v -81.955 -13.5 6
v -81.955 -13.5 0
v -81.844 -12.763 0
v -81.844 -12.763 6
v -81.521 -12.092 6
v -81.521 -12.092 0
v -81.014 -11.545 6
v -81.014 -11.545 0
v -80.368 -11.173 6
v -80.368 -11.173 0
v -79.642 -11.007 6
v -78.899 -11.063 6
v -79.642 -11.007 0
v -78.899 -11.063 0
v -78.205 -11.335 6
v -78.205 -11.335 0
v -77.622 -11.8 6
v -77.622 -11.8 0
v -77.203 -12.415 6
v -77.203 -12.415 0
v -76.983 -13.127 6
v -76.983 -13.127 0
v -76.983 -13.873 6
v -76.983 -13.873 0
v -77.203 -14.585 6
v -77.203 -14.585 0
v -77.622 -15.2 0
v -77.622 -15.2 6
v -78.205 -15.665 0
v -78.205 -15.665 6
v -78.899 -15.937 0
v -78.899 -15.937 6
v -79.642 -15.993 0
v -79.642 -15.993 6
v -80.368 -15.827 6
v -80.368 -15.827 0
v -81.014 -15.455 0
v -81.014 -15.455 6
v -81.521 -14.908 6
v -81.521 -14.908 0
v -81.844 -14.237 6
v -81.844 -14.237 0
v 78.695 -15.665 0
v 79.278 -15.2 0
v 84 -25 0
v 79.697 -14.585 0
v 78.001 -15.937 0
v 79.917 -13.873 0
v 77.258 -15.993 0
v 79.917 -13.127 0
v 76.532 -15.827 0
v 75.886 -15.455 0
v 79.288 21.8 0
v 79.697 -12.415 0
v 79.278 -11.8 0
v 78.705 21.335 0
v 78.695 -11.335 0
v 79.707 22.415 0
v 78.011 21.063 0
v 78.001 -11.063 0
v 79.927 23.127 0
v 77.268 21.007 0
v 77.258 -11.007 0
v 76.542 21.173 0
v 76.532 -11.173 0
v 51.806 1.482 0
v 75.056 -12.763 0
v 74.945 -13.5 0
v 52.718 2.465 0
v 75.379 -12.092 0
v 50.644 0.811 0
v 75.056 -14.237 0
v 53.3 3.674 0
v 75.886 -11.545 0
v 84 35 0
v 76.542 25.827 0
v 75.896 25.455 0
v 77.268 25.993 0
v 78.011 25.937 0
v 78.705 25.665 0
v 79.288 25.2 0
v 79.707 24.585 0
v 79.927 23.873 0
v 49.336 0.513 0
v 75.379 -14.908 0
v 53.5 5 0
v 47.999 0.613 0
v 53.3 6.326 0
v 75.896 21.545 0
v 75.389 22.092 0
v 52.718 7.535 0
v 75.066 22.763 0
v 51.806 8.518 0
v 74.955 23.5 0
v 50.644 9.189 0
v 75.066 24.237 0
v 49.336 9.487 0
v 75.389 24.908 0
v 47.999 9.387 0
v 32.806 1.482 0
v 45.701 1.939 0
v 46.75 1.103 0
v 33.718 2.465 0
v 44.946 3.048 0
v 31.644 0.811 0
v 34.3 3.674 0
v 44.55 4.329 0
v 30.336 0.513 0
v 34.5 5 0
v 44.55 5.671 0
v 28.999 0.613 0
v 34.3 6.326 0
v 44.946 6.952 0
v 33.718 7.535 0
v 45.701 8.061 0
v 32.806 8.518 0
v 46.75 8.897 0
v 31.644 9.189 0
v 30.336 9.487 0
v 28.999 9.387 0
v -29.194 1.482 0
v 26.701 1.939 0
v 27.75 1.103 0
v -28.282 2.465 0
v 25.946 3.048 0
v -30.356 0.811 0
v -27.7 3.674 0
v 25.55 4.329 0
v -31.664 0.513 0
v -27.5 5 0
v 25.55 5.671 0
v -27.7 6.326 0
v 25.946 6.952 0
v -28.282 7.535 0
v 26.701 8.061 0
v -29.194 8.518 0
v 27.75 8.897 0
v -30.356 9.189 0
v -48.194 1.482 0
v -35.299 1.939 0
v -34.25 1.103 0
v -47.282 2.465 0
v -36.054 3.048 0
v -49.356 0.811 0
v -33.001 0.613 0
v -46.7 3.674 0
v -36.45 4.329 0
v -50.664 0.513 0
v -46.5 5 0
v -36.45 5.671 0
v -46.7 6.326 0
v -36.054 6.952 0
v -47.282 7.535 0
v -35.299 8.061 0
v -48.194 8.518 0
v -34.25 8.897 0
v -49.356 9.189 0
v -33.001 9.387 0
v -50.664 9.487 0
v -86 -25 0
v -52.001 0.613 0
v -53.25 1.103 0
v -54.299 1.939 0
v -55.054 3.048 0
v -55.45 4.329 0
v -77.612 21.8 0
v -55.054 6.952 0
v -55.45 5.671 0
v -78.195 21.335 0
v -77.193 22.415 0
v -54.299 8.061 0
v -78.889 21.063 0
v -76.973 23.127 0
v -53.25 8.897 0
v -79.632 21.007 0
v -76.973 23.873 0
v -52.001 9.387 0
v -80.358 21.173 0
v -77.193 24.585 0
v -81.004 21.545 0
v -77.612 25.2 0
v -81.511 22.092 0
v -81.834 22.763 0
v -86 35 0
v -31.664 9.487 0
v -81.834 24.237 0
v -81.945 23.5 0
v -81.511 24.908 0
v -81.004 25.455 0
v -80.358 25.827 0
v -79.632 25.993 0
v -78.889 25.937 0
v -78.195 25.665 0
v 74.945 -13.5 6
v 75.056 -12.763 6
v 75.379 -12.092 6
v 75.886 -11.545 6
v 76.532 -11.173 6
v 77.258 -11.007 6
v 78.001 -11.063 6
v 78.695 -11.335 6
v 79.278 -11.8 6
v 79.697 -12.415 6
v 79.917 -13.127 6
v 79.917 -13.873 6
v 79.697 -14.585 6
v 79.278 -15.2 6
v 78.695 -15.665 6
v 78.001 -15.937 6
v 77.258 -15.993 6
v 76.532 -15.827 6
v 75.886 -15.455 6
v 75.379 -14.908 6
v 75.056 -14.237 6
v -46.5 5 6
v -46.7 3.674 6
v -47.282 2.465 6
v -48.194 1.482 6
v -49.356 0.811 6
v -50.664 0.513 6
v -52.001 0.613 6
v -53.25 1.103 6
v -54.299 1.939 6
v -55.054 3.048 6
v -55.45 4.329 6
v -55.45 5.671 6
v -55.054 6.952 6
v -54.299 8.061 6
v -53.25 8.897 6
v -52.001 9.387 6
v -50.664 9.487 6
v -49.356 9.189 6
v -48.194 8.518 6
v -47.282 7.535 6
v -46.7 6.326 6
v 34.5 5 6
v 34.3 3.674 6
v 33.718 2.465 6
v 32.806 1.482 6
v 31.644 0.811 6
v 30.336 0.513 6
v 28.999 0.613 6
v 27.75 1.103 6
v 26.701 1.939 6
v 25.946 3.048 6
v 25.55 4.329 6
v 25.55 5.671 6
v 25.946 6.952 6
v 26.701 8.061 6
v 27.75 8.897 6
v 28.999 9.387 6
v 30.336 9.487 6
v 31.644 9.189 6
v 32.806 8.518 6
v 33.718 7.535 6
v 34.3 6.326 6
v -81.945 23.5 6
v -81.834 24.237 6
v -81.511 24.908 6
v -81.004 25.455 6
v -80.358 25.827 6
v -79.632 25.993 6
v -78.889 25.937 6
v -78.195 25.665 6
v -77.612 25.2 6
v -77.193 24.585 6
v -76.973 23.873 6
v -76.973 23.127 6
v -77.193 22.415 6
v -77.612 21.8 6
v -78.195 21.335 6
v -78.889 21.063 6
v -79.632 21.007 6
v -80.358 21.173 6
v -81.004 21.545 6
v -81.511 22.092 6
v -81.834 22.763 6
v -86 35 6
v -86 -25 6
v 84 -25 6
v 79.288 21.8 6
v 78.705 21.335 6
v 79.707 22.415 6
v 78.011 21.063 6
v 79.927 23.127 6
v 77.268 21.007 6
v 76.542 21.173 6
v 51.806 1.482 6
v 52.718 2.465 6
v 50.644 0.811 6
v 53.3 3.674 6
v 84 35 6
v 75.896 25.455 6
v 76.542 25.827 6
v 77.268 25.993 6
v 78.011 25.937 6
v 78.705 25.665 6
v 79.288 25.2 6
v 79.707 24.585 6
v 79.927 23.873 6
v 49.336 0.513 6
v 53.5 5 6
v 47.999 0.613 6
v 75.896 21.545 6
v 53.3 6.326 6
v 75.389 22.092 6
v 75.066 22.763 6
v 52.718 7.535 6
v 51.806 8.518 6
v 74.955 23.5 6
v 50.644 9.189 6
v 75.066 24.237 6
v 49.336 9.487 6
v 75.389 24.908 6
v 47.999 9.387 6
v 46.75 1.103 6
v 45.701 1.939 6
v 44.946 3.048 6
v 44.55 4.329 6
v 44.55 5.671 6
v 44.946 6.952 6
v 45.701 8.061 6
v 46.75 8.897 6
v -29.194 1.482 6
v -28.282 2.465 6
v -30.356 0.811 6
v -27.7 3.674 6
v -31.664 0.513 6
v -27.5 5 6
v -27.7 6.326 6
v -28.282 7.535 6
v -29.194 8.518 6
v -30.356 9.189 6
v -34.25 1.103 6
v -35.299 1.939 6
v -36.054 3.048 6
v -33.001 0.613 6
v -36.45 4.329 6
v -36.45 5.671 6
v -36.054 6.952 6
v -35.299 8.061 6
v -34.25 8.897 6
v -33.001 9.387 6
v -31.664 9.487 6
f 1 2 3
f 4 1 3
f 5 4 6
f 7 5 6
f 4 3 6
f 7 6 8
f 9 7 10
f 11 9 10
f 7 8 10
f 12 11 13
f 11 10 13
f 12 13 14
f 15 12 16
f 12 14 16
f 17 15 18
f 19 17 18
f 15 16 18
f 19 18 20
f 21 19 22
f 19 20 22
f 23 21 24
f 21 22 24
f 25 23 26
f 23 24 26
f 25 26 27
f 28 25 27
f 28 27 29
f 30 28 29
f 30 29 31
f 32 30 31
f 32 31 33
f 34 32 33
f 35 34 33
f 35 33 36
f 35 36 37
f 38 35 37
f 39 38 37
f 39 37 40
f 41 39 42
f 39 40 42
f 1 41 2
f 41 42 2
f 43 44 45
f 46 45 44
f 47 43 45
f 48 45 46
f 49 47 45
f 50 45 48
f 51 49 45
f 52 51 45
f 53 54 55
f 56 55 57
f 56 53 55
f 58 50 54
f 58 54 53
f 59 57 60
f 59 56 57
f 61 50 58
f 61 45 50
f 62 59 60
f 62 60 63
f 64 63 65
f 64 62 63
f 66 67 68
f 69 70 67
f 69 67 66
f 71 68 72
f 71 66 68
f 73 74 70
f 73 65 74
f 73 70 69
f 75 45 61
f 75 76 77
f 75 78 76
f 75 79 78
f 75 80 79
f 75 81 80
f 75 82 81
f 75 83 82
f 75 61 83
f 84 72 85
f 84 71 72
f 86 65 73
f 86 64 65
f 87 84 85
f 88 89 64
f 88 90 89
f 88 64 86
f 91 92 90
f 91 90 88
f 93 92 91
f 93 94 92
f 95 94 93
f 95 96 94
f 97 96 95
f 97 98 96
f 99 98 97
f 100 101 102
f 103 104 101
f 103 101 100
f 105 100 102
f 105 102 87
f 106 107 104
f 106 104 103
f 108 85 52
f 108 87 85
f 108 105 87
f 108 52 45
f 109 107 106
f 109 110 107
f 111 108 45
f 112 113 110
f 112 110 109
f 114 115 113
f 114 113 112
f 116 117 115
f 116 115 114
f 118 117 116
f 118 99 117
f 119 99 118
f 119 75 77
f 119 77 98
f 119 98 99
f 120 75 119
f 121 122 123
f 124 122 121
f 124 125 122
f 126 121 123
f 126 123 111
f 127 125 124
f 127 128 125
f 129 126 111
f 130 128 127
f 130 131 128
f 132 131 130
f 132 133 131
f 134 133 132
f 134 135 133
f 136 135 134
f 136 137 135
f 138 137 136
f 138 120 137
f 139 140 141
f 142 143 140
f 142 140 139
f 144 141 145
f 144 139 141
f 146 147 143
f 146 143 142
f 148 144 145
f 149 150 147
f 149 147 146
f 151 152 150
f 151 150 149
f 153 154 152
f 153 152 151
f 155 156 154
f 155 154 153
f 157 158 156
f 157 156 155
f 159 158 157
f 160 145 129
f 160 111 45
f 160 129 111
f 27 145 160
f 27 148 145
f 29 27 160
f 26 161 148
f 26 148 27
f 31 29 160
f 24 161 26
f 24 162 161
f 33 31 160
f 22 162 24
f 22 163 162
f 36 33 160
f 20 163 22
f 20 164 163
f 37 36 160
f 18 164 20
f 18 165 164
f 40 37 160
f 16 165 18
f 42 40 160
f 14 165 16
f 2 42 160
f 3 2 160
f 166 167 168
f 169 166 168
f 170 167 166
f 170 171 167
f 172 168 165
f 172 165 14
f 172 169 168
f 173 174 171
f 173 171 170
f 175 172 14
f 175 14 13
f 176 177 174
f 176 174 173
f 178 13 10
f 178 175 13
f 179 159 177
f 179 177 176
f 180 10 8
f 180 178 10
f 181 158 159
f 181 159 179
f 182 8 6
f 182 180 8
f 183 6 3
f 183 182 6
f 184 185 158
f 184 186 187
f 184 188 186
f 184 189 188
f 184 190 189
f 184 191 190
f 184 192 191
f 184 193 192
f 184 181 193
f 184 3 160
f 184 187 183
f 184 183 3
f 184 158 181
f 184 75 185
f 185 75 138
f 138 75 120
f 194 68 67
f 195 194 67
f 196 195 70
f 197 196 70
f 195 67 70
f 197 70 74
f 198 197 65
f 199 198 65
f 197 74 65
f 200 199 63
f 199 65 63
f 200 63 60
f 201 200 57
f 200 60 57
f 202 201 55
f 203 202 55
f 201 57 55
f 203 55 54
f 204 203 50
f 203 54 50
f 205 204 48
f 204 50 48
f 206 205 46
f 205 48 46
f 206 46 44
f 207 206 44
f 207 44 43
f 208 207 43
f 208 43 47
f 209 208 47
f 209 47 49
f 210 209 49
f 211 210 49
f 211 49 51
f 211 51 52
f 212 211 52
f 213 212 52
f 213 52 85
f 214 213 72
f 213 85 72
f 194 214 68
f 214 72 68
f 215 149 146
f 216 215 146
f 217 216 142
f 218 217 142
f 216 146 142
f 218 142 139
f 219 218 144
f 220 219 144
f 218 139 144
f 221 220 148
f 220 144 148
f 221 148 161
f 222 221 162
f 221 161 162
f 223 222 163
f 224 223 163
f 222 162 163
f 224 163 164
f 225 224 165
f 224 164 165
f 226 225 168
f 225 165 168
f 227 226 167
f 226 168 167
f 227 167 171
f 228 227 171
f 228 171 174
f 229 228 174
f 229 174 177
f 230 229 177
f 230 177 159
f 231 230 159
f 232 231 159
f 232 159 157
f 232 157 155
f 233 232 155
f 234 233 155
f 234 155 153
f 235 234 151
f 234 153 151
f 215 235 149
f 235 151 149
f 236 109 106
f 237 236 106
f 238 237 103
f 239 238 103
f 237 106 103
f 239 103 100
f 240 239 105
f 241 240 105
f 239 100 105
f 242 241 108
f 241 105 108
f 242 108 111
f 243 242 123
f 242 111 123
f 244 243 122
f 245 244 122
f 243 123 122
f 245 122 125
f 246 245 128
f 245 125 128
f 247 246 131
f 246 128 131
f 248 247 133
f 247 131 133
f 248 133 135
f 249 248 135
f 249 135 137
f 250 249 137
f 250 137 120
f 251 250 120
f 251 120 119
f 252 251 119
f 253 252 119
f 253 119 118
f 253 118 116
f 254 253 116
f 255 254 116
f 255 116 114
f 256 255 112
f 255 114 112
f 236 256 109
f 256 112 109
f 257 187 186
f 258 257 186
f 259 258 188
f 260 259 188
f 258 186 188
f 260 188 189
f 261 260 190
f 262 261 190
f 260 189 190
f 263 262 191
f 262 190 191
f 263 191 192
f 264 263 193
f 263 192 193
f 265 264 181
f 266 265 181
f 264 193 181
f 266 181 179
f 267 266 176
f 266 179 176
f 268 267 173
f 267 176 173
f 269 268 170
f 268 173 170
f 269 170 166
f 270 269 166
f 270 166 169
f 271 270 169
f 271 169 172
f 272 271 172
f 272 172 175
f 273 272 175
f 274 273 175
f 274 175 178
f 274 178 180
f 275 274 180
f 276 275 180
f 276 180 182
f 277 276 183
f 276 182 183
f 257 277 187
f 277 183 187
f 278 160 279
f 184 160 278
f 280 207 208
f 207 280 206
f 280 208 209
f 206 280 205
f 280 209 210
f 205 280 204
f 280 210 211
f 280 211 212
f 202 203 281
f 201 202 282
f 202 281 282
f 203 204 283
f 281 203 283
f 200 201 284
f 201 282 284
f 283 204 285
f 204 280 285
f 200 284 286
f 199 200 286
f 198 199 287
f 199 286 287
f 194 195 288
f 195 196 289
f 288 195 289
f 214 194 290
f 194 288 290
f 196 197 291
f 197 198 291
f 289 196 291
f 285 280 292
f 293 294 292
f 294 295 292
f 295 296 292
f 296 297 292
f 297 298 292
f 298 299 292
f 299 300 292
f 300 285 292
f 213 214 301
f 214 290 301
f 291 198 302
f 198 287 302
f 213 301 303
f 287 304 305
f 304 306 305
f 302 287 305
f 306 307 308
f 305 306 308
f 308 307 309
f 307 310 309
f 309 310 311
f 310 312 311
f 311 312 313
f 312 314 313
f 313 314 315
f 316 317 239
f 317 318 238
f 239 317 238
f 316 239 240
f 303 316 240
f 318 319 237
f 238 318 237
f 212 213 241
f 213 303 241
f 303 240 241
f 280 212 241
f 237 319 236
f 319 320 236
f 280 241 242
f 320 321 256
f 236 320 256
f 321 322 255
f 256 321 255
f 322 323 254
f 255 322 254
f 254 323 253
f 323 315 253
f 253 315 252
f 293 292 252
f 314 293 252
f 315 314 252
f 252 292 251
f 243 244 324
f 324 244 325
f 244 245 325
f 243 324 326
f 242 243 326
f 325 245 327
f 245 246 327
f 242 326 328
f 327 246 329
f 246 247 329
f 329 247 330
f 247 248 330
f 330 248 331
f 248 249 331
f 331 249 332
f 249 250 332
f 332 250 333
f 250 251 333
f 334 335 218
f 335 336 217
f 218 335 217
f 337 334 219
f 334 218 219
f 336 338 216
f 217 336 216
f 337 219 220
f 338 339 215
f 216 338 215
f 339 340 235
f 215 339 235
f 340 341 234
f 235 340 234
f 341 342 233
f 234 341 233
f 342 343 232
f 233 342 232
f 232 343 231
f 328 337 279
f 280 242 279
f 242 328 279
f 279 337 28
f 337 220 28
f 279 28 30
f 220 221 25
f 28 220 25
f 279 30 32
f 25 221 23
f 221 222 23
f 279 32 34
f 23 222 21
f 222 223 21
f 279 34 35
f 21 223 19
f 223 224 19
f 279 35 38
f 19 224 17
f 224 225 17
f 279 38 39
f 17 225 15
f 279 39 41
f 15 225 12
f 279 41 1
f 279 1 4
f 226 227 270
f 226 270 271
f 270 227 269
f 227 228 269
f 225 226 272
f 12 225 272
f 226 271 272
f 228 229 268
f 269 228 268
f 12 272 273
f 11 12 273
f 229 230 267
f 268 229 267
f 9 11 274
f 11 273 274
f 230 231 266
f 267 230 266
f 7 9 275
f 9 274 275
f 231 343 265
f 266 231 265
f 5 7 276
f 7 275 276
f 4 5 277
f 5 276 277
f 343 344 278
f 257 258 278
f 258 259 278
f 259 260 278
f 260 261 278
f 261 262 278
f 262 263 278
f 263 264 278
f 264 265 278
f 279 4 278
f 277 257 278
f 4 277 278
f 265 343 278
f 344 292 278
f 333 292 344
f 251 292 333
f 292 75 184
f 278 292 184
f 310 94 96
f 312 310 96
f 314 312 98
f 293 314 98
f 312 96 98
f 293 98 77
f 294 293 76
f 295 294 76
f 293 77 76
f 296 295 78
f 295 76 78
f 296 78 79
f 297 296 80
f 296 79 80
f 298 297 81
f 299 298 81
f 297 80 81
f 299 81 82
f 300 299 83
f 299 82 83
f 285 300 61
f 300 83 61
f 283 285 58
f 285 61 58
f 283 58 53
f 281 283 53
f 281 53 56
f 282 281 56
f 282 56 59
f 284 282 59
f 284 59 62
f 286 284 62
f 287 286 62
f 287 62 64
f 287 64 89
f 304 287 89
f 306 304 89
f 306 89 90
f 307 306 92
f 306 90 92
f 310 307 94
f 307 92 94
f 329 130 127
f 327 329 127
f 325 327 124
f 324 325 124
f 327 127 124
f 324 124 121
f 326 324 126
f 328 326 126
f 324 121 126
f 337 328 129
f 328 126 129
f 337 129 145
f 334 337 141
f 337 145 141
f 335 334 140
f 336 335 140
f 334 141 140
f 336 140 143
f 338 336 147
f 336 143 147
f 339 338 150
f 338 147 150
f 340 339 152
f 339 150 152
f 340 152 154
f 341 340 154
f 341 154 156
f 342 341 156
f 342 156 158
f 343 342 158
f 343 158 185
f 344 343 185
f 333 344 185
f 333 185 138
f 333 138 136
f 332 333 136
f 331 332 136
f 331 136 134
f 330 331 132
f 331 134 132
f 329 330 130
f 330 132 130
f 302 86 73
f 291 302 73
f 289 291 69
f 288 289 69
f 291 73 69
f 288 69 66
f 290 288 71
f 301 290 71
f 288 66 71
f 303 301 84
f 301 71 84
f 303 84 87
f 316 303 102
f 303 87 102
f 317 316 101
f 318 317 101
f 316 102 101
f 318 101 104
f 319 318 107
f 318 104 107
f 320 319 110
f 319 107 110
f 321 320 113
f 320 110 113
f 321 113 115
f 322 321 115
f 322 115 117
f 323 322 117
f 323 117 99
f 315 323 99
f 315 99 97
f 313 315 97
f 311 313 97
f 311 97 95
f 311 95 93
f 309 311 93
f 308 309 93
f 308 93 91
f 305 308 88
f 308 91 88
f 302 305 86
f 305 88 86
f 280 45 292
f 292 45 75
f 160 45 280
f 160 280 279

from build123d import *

# Parameters (mm, degrees)
SKETCH1_W           = 170
SKETCH1_H           = 60
SKETCH1_R           = 4.5
SKETCH1_R_2         = 2.5
BOSS_EXTRUDE1_DEPTH = 6


with BuildPart() as part:
    # Sketch1 → Boss-Extrude1 (new body)
    with BuildSketch(Plane(origin=(0, 0, 0), x_dir=(-1, 0, 0), z_dir=(0, 0, -1))):
        with Locations((1, 5)):
            Rectangle(SKETCH1_W, SKETCH1_H)
        with Locations(Location((-30, 5, 0), (0, 0, 180))):
            Circle(SKETCH1_R, mode=Mode.SUBTRACT)
        with Locations(Location((-49, 5, 0), (0, 0, 180))):
            Circle(SKETCH1_R, mode=Mode.SUBTRACT)
        with Locations(Location((32, 5, 0), (0, 0, 180))):
            Circle(SKETCH1_R, mode=Mode.SUBTRACT)
        with Locations(Location((51, 5, 0), (0, 0, 180))):
            Circle(SKETCH1_R, mode=Mode.SUBTRACT)
        with Locations((79.445, 23.5)):
            Circle(SKETCH1_R_2, mode=Mode.SUBTRACT)
        with Locations((79.455, -13.5)):
            Circle(SKETCH1_R_2, mode=Mode.SUBTRACT)
        with Locations((-77.445, -13.5)):
            Circle(SKETCH1_R_2, mode=Mode.SUBTRACT)
        with Locations((-77.455, 23.5)):
            Circle(SKETCH1_R_2, mode=Mode.SUBTRACT)
    extrude(amount=-BOSS_EXTRUDE1_DEPTH)


solid = part.part
